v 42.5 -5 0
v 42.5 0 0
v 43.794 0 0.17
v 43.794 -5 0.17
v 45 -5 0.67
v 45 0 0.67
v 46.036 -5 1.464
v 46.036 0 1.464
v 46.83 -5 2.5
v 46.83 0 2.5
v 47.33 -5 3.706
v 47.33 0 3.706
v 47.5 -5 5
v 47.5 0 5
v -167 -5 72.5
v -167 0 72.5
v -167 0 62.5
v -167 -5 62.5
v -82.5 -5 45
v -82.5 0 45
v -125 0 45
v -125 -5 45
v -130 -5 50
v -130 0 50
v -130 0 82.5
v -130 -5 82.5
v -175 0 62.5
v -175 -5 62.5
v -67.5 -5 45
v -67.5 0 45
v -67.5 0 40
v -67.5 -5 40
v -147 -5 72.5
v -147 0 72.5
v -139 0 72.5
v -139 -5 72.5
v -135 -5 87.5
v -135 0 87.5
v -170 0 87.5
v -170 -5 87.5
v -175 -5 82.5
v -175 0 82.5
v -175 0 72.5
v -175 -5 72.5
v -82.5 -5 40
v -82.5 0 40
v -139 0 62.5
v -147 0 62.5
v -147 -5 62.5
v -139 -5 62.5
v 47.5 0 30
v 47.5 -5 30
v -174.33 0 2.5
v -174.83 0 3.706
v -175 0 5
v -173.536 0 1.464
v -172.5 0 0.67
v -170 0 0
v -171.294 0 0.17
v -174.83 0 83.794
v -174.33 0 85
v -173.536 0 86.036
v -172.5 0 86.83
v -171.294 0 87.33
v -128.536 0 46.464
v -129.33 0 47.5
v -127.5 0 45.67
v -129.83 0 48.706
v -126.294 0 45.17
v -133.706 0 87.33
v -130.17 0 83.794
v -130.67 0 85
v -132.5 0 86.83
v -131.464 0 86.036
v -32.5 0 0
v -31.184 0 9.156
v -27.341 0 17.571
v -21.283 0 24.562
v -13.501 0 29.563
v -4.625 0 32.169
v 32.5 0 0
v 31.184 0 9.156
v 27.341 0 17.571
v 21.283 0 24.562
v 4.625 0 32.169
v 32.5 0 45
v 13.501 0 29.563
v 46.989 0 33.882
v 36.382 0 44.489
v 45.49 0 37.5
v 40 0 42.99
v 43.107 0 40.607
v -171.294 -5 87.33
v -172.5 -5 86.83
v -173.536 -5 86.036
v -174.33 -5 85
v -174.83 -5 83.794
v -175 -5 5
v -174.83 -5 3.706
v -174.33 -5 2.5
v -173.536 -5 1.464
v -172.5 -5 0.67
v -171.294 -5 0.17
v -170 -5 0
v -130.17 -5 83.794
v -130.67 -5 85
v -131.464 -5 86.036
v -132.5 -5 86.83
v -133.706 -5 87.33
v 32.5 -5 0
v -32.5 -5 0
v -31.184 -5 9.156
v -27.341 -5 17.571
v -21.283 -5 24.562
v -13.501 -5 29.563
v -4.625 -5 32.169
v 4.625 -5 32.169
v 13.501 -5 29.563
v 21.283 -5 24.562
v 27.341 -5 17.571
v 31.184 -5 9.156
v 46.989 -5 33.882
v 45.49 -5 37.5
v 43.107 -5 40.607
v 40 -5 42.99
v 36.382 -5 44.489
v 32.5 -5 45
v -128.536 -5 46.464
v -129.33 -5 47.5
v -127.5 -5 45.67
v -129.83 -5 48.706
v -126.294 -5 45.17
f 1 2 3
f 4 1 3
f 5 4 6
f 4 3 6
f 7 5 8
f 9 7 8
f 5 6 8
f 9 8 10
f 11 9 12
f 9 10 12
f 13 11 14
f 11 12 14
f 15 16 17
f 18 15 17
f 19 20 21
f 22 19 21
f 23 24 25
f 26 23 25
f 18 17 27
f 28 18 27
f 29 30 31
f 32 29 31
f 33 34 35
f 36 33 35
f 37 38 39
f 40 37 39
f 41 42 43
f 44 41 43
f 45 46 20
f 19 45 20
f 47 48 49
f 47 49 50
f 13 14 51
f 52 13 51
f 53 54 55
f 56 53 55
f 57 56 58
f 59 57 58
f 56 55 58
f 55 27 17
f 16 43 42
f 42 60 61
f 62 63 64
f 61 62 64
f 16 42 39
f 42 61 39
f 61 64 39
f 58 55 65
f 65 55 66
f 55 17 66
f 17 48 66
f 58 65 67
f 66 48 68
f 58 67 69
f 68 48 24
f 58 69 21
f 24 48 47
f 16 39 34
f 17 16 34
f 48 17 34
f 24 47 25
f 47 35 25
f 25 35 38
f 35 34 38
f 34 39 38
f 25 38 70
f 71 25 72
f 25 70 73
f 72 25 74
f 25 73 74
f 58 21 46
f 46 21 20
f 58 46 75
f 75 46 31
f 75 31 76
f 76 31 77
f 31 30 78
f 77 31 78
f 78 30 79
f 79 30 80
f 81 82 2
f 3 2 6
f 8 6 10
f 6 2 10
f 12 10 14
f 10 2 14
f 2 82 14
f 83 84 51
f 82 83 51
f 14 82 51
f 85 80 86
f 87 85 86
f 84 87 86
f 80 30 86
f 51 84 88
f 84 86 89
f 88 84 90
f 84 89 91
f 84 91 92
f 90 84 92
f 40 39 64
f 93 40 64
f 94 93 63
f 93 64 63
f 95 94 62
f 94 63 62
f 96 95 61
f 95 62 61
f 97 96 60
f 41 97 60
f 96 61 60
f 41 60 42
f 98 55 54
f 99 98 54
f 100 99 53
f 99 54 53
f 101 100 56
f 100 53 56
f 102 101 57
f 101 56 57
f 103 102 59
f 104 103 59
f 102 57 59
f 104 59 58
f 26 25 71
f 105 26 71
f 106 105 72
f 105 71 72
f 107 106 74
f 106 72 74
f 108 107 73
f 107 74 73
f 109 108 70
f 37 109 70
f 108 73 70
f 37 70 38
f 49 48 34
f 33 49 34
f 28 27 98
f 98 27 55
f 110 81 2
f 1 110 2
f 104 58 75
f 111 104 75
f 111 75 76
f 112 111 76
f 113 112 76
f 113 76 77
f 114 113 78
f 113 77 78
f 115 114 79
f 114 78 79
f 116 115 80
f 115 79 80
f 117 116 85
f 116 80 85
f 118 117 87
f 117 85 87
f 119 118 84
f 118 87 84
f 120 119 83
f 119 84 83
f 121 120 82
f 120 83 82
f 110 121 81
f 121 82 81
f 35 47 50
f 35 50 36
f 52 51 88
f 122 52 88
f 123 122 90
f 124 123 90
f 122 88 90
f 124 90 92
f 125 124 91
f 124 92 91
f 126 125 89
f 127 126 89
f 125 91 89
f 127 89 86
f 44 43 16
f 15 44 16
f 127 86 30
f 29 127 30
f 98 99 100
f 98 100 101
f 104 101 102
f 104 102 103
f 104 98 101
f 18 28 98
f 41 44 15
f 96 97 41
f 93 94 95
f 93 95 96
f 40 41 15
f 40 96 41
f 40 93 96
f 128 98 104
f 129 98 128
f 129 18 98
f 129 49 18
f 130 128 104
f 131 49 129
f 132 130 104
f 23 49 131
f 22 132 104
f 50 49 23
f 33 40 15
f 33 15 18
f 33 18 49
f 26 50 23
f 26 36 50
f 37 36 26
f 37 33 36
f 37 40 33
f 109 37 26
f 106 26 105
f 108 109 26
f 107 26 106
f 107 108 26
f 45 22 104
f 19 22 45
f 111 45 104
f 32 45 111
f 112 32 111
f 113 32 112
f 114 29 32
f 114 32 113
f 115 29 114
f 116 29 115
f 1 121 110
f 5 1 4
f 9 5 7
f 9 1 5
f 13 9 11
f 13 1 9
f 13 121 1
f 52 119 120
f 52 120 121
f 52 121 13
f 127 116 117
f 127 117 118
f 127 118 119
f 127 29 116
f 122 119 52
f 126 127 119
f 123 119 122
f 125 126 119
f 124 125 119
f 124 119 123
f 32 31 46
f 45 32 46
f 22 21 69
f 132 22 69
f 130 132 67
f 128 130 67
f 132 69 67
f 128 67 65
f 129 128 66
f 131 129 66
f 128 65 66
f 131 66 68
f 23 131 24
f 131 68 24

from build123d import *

# Parameters (mm, degrees)
F0_W     = 8
F0_H     = 10
F1_DEPTH = 5


with BuildPart() as f1:
    # F0 (on Front) → F1 (new body)
    with BuildSketch(Plane.XZ):
        with BuildLine():
            ThreePointArc((-32.5, 0), (0, 32.5), (32.5, 0))
            Line((32.5, 0), (42.5, 0))
            ThreePointArc((42.5, 0), (46.035534, 1.464466), (47.5, 5))
            Line((47.5, 5), (47.5, 30))
            ThreePointArc((47.5, 30), (43.106602, 40.606602), (32.5, 45))
            Line((32.5, 45), (-67.5, 45))
            Line((-67.5, 45), (-67.5, 40))
            Line((-67.5, 40), (-82.5, 40))
            Line((-82.5, 40), (-82.5, 45))
            Line((-82.5, 45), (-125, 45))
            ThreePointArc((-125, 45), (-128.535534, 46.464466), (-130, 50))
            Line((-130, 50), (-130, 82.5))
            ThreePointArc((-130, 82.5), (-131.464466, 86.035534), (-135, 87.5))
            Line((-135, 87.5), (-170, 87.5))
            ThreePointArc((-170, 87.5), (-173.535534, 86.035534), (-175, 82.5))
            Line((-175, 82.5), (-175, 72.5))
            Line((-175, 72.5), (-167, 72.5))
            Line((-167, 72.5), (-167, 62.5))
            Line((-167, 62.5), (-175, 62.5))
            Line((-175, 62.5), (-175, 5))
            ThreePointArc((-175, 5), (-173.535534, 1.464466), (-170, 0))
            Line((-170, 0), (-32.5, 0))
        make_face()
        with Locations((-143, 67.5)):
            Rectangle(F0_W, F0_H, mode=Mode.SUBTRACT)
    extrude(amount=F1_DEPTH)


solid = f1.part
